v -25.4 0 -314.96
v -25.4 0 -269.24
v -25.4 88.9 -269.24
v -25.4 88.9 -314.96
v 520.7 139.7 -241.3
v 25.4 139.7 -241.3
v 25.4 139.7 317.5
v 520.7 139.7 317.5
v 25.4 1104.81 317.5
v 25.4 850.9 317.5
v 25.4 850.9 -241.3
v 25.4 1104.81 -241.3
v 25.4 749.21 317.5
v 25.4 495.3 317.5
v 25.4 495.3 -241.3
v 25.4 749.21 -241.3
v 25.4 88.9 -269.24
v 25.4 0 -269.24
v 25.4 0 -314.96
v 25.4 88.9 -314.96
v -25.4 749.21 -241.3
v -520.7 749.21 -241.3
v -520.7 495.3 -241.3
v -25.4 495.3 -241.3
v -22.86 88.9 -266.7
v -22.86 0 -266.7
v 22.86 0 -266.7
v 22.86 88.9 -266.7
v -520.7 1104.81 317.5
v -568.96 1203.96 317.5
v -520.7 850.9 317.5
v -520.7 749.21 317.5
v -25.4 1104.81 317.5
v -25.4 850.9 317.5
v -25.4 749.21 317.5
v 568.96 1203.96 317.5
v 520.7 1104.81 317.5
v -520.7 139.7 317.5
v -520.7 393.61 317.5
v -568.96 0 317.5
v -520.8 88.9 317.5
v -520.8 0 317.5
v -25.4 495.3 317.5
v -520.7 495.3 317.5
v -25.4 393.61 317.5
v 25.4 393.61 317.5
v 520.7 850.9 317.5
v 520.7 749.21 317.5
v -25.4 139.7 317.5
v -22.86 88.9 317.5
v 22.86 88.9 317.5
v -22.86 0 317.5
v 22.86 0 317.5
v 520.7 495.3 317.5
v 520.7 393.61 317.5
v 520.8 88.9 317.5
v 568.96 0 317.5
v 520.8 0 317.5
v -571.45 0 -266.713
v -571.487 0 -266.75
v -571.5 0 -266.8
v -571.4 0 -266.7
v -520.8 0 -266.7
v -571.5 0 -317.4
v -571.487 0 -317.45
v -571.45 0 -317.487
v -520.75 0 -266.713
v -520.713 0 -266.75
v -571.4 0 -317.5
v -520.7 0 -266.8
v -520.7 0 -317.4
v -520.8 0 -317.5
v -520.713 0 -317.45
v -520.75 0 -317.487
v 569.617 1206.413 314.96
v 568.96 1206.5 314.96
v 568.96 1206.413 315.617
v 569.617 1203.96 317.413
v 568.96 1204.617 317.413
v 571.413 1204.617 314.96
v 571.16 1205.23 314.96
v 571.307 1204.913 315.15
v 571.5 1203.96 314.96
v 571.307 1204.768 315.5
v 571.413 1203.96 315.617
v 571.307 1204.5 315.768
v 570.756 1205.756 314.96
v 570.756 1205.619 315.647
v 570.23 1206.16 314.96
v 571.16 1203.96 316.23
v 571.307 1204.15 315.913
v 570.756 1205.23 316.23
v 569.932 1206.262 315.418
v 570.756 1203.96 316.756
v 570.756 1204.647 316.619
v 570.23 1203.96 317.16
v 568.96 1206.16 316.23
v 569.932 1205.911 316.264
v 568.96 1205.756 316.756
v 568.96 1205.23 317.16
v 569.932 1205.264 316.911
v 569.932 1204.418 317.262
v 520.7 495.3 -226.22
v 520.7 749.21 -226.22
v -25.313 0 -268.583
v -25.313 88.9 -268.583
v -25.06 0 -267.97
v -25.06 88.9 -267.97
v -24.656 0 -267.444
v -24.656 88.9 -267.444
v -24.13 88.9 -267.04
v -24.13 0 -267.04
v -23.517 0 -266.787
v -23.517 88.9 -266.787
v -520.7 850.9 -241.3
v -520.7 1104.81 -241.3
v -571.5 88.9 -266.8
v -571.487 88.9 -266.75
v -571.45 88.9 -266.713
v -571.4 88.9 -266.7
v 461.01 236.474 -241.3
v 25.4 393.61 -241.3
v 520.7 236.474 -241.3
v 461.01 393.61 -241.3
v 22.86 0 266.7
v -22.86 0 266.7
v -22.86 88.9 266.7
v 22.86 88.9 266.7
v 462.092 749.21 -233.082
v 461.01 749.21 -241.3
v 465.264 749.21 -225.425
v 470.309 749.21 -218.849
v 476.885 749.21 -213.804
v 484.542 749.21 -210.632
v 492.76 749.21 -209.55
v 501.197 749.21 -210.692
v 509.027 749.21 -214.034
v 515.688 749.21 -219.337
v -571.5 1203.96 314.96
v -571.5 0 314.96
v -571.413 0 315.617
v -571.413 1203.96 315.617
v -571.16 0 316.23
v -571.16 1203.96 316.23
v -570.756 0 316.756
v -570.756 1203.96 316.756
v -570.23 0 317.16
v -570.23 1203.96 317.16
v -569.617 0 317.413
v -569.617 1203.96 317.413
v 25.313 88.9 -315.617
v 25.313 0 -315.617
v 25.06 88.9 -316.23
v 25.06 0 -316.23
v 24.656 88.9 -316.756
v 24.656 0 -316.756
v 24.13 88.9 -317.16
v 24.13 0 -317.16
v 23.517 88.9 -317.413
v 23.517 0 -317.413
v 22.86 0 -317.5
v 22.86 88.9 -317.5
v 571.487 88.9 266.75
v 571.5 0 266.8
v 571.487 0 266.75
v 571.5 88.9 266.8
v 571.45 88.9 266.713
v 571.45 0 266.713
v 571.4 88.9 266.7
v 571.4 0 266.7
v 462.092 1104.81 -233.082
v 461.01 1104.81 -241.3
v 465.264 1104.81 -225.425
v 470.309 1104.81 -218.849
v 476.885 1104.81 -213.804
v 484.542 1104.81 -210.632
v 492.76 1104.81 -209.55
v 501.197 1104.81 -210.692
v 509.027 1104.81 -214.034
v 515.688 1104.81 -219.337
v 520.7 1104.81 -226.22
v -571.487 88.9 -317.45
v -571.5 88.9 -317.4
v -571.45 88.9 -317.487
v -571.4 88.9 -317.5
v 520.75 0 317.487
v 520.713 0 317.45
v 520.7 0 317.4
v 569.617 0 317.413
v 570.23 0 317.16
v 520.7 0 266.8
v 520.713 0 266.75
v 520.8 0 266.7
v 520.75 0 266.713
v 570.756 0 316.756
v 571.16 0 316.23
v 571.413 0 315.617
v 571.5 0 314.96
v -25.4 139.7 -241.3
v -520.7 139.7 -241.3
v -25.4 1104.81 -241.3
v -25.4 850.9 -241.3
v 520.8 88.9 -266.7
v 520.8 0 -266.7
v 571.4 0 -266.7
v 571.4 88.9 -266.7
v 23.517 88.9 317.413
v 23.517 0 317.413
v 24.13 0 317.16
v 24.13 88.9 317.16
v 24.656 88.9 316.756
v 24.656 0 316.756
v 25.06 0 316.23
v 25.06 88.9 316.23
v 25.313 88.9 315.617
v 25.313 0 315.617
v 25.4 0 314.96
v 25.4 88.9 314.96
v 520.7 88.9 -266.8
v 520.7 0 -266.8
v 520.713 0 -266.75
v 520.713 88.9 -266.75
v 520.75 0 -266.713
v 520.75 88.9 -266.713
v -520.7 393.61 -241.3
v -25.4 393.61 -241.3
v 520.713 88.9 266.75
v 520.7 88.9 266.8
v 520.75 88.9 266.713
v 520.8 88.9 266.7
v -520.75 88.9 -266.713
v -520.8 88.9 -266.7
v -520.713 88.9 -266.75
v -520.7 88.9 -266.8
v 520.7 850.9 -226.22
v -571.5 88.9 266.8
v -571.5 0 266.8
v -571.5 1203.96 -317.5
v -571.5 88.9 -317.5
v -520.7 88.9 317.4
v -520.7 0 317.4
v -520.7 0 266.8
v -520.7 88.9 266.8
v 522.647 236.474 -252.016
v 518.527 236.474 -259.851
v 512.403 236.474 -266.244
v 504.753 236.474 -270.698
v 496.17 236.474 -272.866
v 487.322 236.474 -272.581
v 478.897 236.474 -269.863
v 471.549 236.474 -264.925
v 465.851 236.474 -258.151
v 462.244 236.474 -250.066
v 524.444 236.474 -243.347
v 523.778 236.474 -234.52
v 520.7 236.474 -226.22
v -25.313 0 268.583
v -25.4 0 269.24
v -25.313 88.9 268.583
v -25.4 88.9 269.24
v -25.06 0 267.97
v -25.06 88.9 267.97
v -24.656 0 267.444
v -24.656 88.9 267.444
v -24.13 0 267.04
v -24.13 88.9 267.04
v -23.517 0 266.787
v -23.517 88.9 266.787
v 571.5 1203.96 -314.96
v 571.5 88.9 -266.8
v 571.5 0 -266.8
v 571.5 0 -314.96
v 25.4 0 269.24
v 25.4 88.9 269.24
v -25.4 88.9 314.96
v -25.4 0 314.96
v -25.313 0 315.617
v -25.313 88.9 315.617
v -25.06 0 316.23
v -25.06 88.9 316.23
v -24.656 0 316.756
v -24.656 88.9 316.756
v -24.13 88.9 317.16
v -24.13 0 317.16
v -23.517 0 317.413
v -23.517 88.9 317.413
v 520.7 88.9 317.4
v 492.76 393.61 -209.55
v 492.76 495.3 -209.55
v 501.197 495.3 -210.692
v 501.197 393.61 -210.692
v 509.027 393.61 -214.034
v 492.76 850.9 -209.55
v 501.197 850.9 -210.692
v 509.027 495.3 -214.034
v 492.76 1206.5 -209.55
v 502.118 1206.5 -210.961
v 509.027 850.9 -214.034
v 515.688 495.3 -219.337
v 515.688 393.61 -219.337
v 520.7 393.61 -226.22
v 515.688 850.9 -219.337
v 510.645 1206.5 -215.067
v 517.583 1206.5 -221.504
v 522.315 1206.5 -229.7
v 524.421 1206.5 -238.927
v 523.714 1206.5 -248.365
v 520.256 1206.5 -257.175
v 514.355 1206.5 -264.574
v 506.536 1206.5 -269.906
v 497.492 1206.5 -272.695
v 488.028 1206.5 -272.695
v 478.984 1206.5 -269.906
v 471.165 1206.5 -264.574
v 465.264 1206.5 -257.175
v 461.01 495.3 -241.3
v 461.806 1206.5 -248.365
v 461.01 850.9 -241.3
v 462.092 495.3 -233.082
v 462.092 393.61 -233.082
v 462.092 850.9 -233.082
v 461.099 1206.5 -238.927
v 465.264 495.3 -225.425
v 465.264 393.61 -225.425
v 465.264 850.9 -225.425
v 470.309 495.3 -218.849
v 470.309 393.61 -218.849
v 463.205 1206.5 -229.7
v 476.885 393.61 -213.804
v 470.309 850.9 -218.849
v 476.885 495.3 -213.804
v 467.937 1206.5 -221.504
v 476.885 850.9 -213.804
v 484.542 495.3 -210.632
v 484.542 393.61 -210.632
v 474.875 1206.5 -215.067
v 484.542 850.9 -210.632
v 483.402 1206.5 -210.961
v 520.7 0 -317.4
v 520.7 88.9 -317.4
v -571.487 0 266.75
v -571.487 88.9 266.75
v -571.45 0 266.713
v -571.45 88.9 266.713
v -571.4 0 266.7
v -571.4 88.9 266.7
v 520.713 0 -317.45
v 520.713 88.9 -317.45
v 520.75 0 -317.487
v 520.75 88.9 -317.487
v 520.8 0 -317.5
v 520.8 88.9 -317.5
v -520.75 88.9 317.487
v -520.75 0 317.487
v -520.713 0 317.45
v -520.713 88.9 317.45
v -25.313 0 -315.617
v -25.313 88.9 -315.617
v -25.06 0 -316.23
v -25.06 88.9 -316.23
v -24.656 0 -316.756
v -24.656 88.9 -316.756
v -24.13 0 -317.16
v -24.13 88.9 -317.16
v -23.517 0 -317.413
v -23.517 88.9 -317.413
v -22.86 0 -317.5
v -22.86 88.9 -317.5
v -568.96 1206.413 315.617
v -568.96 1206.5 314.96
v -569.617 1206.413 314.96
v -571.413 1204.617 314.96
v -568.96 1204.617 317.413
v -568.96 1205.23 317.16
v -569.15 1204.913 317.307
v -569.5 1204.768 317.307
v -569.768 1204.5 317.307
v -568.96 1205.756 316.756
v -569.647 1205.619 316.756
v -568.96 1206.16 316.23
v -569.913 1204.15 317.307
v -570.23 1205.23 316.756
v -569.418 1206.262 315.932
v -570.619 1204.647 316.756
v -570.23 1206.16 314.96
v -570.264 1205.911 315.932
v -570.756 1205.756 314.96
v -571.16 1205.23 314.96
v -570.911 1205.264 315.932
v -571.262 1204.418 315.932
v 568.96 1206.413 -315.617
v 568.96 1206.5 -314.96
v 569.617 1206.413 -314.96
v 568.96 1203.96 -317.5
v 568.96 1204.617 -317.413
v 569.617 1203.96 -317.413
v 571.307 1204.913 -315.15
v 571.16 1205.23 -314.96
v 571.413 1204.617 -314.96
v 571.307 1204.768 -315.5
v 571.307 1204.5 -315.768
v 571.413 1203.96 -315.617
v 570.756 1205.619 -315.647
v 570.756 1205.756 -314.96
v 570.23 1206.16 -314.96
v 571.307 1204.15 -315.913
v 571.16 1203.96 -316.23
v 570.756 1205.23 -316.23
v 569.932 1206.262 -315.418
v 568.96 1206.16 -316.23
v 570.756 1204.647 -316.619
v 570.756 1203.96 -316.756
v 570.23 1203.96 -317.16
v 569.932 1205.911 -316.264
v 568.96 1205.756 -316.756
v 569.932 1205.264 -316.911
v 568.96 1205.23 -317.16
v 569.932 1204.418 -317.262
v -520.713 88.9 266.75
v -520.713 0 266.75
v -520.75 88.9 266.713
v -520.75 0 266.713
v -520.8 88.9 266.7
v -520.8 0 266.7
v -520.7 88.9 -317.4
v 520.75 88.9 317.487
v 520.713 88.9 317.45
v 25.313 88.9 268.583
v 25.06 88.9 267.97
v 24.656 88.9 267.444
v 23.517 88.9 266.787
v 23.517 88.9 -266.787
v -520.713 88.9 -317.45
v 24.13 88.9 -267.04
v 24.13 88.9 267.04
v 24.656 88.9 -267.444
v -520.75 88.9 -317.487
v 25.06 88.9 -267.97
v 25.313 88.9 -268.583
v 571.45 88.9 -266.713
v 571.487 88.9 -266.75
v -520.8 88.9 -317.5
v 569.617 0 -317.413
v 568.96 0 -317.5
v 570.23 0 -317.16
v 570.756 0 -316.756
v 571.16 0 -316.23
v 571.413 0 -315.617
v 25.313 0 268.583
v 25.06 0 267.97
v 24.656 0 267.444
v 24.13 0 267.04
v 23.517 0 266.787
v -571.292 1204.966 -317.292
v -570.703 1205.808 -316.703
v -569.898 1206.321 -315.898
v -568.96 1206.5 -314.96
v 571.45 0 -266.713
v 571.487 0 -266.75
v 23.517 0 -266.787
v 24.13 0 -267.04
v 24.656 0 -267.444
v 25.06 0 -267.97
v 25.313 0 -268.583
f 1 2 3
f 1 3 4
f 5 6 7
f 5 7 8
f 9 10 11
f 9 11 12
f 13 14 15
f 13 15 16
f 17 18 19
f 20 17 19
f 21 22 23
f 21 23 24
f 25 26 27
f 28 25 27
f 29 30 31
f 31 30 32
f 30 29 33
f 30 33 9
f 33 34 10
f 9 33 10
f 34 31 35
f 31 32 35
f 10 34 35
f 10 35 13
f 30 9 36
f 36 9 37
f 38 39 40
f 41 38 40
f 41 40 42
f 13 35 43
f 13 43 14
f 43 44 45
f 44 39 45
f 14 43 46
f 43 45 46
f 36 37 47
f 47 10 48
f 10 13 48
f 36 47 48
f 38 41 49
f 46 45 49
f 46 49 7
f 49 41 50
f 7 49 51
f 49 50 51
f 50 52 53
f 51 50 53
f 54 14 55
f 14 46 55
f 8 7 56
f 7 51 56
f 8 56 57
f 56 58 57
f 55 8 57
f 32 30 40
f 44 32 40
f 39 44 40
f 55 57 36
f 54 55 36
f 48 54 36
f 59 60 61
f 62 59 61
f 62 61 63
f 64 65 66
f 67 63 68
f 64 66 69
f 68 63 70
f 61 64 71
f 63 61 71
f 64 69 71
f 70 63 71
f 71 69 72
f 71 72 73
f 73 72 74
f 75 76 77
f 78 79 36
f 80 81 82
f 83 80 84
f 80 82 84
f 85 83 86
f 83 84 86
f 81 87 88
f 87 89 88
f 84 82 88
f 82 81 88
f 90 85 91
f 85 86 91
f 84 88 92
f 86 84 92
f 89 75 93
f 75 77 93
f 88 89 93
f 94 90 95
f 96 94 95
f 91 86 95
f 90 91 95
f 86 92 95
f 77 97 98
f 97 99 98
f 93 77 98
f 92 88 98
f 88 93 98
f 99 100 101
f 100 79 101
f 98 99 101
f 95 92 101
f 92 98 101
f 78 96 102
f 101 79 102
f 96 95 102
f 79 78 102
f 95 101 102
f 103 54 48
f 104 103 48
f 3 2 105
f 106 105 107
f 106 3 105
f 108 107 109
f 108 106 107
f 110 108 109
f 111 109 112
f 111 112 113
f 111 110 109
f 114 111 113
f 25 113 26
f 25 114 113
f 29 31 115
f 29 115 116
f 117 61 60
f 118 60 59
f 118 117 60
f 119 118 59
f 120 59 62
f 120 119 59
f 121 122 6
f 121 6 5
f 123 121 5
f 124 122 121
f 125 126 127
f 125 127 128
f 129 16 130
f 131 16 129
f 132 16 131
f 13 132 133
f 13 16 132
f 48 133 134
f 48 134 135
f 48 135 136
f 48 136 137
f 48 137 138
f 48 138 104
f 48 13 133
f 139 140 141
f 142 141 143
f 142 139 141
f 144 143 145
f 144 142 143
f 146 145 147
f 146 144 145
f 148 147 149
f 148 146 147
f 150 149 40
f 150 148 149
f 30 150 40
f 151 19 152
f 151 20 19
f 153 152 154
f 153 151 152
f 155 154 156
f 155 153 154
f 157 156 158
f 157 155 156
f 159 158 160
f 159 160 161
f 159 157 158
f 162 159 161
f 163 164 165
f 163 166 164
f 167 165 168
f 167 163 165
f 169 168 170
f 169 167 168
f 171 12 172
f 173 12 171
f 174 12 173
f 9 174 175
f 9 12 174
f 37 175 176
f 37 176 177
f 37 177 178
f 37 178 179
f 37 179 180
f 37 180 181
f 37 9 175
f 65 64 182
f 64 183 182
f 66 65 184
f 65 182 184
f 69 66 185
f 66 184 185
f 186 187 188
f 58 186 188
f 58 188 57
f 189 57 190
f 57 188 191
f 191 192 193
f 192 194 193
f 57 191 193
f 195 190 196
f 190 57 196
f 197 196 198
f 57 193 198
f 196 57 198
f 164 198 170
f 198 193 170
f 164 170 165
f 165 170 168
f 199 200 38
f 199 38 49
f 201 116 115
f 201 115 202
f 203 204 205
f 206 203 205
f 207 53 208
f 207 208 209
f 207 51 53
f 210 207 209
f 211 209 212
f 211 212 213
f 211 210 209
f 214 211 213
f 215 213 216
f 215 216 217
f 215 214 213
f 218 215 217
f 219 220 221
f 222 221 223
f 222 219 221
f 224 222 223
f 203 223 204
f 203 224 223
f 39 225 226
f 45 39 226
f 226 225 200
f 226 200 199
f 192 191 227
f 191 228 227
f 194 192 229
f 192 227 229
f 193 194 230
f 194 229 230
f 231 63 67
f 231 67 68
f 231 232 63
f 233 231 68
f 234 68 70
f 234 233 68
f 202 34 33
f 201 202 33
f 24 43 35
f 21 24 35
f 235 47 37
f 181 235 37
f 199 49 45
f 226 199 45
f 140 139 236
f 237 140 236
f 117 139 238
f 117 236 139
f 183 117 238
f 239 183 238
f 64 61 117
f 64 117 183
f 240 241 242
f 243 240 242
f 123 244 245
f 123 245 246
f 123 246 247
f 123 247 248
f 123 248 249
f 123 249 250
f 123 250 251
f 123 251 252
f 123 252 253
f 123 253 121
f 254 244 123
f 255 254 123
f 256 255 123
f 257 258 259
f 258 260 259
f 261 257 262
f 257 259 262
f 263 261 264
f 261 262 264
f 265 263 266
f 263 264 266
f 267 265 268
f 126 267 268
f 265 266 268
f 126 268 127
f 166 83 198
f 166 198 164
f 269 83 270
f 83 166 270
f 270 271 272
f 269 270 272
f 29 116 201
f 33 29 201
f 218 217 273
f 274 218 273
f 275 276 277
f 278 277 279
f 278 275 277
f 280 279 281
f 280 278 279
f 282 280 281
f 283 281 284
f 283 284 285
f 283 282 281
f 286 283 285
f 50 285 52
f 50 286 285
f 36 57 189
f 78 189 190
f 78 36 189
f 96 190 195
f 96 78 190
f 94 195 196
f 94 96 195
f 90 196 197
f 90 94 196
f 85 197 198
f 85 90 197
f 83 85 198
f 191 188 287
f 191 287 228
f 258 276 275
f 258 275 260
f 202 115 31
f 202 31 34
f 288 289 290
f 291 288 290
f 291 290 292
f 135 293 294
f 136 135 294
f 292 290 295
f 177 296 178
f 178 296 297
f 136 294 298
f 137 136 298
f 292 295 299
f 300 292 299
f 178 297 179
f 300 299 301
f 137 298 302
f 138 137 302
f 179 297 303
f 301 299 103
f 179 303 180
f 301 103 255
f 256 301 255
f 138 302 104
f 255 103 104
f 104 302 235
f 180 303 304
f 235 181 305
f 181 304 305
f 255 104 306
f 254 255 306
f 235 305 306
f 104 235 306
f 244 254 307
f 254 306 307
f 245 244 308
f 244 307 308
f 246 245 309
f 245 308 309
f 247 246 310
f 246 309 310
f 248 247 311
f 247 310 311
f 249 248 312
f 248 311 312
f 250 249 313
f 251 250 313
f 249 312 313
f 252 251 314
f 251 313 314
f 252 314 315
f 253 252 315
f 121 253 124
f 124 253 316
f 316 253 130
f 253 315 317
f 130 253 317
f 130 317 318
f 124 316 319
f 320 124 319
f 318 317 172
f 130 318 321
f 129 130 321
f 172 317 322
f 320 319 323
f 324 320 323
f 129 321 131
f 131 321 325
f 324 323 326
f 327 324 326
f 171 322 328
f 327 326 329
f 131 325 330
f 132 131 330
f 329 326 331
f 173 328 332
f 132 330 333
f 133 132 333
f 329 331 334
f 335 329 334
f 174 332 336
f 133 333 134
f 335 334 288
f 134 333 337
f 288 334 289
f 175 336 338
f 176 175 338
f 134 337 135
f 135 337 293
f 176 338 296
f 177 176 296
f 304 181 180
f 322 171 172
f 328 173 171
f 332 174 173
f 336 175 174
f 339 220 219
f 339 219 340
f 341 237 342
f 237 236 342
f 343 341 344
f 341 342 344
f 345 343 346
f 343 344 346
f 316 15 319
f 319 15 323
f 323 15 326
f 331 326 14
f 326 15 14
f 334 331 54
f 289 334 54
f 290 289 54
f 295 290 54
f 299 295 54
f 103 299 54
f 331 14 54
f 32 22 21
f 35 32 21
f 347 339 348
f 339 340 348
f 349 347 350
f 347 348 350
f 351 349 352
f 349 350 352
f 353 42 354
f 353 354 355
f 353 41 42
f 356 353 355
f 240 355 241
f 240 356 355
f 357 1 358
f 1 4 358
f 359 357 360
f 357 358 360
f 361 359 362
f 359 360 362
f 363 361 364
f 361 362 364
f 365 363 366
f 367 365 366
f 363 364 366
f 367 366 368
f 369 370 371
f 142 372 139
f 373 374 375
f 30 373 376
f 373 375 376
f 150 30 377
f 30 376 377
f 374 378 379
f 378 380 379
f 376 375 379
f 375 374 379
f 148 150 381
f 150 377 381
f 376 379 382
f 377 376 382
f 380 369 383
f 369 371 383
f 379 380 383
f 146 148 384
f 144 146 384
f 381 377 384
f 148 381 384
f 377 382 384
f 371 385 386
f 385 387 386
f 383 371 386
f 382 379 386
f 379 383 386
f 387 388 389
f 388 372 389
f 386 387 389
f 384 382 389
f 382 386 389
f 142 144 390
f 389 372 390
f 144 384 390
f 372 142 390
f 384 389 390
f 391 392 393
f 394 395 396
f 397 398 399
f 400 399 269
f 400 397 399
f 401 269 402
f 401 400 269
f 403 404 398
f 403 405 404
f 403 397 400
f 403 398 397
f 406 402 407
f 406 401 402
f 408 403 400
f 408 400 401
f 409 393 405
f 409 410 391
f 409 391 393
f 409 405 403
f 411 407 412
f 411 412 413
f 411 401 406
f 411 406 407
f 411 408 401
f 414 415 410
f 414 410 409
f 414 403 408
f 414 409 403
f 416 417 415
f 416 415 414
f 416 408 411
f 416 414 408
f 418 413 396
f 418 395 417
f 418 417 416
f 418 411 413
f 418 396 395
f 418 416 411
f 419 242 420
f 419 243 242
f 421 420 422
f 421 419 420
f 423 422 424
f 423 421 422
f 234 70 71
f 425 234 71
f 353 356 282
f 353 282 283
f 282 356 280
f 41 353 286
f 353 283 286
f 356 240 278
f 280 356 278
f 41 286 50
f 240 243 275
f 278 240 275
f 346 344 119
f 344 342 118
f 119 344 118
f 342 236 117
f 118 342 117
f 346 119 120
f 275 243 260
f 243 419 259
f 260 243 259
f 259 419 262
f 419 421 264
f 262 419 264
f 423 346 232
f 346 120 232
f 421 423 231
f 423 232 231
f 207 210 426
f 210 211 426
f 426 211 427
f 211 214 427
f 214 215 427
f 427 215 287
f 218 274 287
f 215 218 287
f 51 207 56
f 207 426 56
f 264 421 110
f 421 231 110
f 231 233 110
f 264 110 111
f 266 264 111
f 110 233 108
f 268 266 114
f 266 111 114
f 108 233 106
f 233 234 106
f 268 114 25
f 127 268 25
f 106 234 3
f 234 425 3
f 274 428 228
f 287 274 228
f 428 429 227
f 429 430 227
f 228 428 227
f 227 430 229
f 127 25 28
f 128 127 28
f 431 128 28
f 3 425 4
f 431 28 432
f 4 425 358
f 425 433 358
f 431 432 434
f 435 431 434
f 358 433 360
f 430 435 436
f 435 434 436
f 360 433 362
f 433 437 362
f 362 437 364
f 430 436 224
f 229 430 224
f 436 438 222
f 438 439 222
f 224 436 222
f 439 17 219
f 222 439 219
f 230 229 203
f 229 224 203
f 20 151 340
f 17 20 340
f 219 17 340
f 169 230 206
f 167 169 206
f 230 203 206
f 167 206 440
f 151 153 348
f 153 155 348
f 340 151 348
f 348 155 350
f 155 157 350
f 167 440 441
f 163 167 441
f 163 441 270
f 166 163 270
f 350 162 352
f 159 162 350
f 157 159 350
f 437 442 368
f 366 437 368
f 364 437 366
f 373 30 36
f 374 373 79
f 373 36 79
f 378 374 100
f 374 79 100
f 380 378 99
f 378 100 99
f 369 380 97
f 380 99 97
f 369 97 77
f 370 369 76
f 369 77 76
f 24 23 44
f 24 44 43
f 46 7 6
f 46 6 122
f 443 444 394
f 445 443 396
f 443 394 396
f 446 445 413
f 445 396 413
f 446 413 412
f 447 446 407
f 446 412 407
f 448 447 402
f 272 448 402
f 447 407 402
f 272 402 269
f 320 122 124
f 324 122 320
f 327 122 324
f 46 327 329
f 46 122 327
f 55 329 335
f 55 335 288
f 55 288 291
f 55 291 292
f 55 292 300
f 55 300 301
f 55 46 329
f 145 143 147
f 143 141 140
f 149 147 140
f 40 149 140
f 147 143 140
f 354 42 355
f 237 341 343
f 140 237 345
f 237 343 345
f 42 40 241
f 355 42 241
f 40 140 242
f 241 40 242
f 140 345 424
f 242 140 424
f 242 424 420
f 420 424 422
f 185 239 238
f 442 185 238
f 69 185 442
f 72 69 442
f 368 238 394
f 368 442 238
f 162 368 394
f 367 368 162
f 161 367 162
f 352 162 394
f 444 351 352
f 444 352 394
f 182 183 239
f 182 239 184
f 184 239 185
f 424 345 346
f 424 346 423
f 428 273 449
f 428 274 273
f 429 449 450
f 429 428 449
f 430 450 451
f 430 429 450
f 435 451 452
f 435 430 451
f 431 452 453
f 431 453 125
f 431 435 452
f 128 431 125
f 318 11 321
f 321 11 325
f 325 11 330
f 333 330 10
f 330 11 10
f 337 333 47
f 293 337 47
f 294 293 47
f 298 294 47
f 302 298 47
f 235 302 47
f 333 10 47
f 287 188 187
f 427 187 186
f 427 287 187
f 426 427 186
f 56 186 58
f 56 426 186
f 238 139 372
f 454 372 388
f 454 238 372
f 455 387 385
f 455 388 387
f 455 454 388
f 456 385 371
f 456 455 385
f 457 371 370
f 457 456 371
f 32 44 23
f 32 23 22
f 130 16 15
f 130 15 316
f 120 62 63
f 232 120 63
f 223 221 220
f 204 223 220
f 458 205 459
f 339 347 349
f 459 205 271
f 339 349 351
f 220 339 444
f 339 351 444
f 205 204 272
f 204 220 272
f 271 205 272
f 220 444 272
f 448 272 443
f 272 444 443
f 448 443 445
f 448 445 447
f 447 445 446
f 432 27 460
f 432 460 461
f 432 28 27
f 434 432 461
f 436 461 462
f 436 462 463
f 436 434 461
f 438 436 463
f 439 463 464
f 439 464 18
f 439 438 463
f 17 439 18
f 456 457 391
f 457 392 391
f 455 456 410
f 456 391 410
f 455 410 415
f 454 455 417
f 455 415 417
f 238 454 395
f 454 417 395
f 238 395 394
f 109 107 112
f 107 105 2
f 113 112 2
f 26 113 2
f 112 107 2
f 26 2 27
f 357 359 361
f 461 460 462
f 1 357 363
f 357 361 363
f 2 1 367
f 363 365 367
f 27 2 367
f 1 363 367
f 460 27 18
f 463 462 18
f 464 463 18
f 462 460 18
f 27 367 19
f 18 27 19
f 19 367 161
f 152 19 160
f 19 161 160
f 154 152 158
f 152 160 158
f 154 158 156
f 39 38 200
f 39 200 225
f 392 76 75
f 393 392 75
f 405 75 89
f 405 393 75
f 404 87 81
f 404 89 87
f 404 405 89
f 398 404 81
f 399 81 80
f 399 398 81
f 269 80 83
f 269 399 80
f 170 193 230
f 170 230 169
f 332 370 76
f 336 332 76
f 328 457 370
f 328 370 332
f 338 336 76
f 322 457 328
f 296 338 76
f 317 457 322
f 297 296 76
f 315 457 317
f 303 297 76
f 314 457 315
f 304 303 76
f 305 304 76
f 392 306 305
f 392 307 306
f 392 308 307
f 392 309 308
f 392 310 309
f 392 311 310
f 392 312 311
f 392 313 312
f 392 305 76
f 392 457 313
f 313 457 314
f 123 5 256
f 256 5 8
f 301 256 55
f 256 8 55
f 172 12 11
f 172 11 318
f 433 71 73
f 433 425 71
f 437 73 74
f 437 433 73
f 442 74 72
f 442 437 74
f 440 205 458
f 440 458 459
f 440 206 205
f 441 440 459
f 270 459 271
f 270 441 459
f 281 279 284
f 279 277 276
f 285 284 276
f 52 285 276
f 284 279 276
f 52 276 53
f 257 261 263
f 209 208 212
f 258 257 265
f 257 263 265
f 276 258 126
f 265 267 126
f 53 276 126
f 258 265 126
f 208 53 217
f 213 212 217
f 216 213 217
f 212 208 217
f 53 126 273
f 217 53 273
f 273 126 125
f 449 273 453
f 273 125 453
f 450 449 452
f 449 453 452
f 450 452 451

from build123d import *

# Parameters (mm, degrees)
SKETCH3_W            = 50.8
SKETCH3_H            = 50.8
BOSS_EXTRUDE1_DEPTH  = 88.9
SKETCH4_W            = 50.8
SKETCH4_H            = 50.8
BOSS_EXTRUDE2_DEPTH  = 88.9
SKETCH5_W            = 50.8
SKETCH5_H            = 50.8
BOSS_EXTRUDE3_DEPTH  = 88.9
FILLET1_R            = 0.1
FILLET2_R            = 0.1
FILLET3_R            = 0.1
SKETCH6_W            = 50.8
SKETCH6_H            = 50.8
BOSS_EXTRUDE4_DEPTH  = 88.9
FILLET4_R            = 0.1
SKETCH8_W            = 50.8
SKETCH8_H            = 50.8
BOSS_EXTRUDE5_DEPTH  = 88.9
SKETCH9_W            = 50.8
SKETCH9_H            = 50.8
BOSS_EXTRUDE6_DEPTH  = 88.9
FILLET5_R            = 2.54
FILLET6_R            = 2.54
SKETCH10_W           = 1143
SKETCH10_H           = 635
BOSS_EXTRUDE7_DEPTH  = 1117.6
SKETCH11_W           = 495.3
SKETCH11_H           = 253.909609279
CUT_EXTRUDE1_DEPTH   = 558.8
FILLET7_R            = 2.54
LPATTERN1_COUNT      = 3
LPATTERN1_PITCH      = 355.6
LPATTERN1_COUNT_DIR2 = 2
LPATTERN1_PITCH_DIR2 = 546.1
SKETCH13_R           = 31.75
CUT_EXTRUDE2_DEPTH   = 970.026


with BuildPart() as part:
    # Sketch3 → Boss-Extrude1 (new body)
    with BuildSketch(Plane(origin=(0, 0, 0), x_dir=(1, 0, 0), z_dir=(0, 1, 0))):
        with Locations((546.1, 292.1)):
            Rectangle(SKETCH3_W, SKETCH3_H)
    extrude(amount=BOSS_EXTRUDE1_DEPTH)

    # Fillet2
    fillet2_edges = [part.edges().sort_by_distance(p)[0] for p in [
        (520.7, 44.45, -317.5),
        (571.5, 44.45, -317.5),
        (571.5, 44.45, -266.7),
        (520.7, 44.45, -266.7),
    ]]
    fillet(fillet2_edges, radius=FILLET2_R)



with BuildPart() as body_2:
    # Sketch4 → Boss-Extrude2 (new body)
    with BuildSketch(Plane(origin=(0, 0, 0), x_dir=(1, 0, 0), z_dir=(0, 1, 0))):
        with Locations((546.1, -292.1)):
            Rectangle(SKETCH4_W, SKETCH4_H)
    extrude(amount=BOSS_EXTRUDE2_DEPTH)

    # Fillet1
    fillet1_edges = [body_2.edges().sort_by_distance(p)[0] for p in [
        (520.7, 44.45, 266.7),
        (571.5, 44.45, 266.7),
        (571.5, 44.45, 317.5),
        (520.7, 44.45, 317.5),
    ]]
    fillet(fillet1_edges, radius=FILLET1_R)


with BuildPart() as body_3:
    # Sketch5 → Boss-Extrude3 (new body)
    with BuildSketch(Plane(origin=(0, 0, 0), x_dir=(1, 0, 0), z_dir=(0, 1, 0))):
        with Locations((-546.1, 292.1)):
            Rectangle(SKETCH5_W, SKETCH5_H)
    extrude(amount=BOSS_EXTRUDE3_DEPTH)

    # Fillet3
    fillet3_edges = [body_3.edges().sort_by_distance(p)[0] for p in [
        (-520.7, 44.45, -266.7),
        (-571.5, 44.45, -266.7),
        (-571.5, 44.45, -317.5),
        (-520.7, 44.45, -317.5),
    ]]
    fillet(fillet3_edges, radius=FILLET3_R)


with BuildPart() as body_4:
    # Sketch6 → Boss-Extrude4 (new body)
    with BuildSketch(Plane(origin=(0, 0, 0), x_dir=(1, 0, 0), z_dir=(0, 1, 0))):
        with Locations((-546.1, -292.1)):
            Rectangle(SKETCH6_W, SKETCH6_H)
    extrude(amount=BOSS_EXTRUDE4_DEPTH)

    # Fillet4
    fillet4_edges = [body_4.edges().sort_by_distance(p)[0] for p in [
        (-520.7, 44.45, 317.5),
        (-571.5, 44.45, 317.5),
        (-571.5, 44.45, 266.7),
        (-520.7, 44.45, 266.7),
    ]]
    fillet(fillet4_edges, radius=FILLET4_R)


with BuildPart() as body_5:
    # Sketch8 → Boss-Extrude5 (new body)
    with BuildSketch(Plane(origin=(0, 0, 0), x_dir=(1, 0, 0), z_dir=(0, 1, 0))):
        with Locations((0, 292.1)):
            Rectangle(SKETCH8_W, SKETCH8_H)
    extrude(amount=BOSS_EXTRUDE5_DEPTH)

    # Fillet6
    fillet6_edges = [body_5.edges().sort_by_distance(p)[0] for p in [
        (25.4, 44.45, -266.7),
        (-25.4, 44.45, -266.7),
        (-25.4, 44.45, -317.5),
        (25.4, 44.45, -317.5),
    ]]
    fillet(fillet6_edges, radius=FILLET6_R)


with BuildPart() as body_6:
    # Sketch9 → Boss-Extrude6 (new body)
    with BuildSketch(Plane(origin=(0, 0, 0), x_dir=(1, 0, 0), z_dir=(0, 1, 0))):
        with Locations((0, -292.1)):
            Rectangle(SKETCH9_W, SKETCH9_H)
    extrude(amount=BOSS_EXTRUDE6_DEPTH)

    # Fillet5
    fillet5_edges = [body_6.edges().sort_by_distance(p)[0] for p in [
        (25.4, 44.45, 317.5),
        (-25.4, 44.45, 317.5),
        (-25.4, 44.45, 266.7),
        (25.4, 44.45, 266.7),
    ]]
    fillet(fillet5_edges, radius=FILLET5_R)


with BuildPart() as part_1:
    add(part.part)

    add(body_2.part)  # Boss-Extrude7 merges body 2

    add(body_3.part)  # Boss-Extrude7 merges body 3

    add(body_4.part)  # Boss-Extrude7 merges body 4

    add(body_5.part)  # Boss-Extrude7 merges body 5

    add(body_6.part)  # Boss-Extrude7 merges body 6
    # Sketch10 → Boss-Extrude7 (add)
    with BuildSketch(Plane(origin=(0, 88.9, 0), x_dir=(1, 0, 0), z_dir=(0, 1, 0))):
        Rectangle(SKETCH10_W, SKETCH10_H)
    extrude(amount=BOSS_EXTRUDE7_DEPTH)

    # Sketch11 → Cut-Extrude1 (cut)
    with BuildSketch(Plane.XY.offset(317.5)):
        with Locations((-273.05, 266.65480464)):
            Rectangle(SKETCH11_W, SKETCH11_H)
    cut_extrude1 = extrude(amount=-CUT_EXTRUDE1_DEPTH, mode=Mode.SUBTRACT)

    # Fillet7
    fillet7_edges = [part_1.edges().sort_by_distance(p)[0] for p in [
        (-571.5, 1206.5, 0),
        (0, 1206.5, 317.5),
        (0, 1206.5, -317.5),
        (571.5, 1206.5, 0),
        (571.5, 647.7, -317.5),
        (571.5, 647.7, 317.5),
        (-571.5, 647.7, 317.5),
    ]]
    fillet(fillet7_edges, radius=FILLET7_R)

    # LPattern1: Cut-Extrude1 3 × 2
    with Locations(*[(j * LPATTERN1_PITCH_DIR2, i * LPATTERN1_PITCH, 0) for i in range(LPATTERN1_COUNT) for j in range(LPATTERN1_COUNT_DIR2) if (i, j) != (0, 0)]):
        add(cut_extrude1, mode=Mode.SUBTRACT)

    # Sketch13 → Cut-Extrude2 (cut)
    with BuildSketch(Plane(origin=(0, 1206.5, 0), x_dir=(1, 0, 0), z_dir=(0, 1, 0))):
        with Locations(Location((492.76, 241.3, 0), (0, 0, 270))):
            Circle(SKETCH13_R)
    extrude(amount=-CUT_EXTRUDE2_DEPTH, mode=Mode.SUBTRACT)


solid = part_1.part
